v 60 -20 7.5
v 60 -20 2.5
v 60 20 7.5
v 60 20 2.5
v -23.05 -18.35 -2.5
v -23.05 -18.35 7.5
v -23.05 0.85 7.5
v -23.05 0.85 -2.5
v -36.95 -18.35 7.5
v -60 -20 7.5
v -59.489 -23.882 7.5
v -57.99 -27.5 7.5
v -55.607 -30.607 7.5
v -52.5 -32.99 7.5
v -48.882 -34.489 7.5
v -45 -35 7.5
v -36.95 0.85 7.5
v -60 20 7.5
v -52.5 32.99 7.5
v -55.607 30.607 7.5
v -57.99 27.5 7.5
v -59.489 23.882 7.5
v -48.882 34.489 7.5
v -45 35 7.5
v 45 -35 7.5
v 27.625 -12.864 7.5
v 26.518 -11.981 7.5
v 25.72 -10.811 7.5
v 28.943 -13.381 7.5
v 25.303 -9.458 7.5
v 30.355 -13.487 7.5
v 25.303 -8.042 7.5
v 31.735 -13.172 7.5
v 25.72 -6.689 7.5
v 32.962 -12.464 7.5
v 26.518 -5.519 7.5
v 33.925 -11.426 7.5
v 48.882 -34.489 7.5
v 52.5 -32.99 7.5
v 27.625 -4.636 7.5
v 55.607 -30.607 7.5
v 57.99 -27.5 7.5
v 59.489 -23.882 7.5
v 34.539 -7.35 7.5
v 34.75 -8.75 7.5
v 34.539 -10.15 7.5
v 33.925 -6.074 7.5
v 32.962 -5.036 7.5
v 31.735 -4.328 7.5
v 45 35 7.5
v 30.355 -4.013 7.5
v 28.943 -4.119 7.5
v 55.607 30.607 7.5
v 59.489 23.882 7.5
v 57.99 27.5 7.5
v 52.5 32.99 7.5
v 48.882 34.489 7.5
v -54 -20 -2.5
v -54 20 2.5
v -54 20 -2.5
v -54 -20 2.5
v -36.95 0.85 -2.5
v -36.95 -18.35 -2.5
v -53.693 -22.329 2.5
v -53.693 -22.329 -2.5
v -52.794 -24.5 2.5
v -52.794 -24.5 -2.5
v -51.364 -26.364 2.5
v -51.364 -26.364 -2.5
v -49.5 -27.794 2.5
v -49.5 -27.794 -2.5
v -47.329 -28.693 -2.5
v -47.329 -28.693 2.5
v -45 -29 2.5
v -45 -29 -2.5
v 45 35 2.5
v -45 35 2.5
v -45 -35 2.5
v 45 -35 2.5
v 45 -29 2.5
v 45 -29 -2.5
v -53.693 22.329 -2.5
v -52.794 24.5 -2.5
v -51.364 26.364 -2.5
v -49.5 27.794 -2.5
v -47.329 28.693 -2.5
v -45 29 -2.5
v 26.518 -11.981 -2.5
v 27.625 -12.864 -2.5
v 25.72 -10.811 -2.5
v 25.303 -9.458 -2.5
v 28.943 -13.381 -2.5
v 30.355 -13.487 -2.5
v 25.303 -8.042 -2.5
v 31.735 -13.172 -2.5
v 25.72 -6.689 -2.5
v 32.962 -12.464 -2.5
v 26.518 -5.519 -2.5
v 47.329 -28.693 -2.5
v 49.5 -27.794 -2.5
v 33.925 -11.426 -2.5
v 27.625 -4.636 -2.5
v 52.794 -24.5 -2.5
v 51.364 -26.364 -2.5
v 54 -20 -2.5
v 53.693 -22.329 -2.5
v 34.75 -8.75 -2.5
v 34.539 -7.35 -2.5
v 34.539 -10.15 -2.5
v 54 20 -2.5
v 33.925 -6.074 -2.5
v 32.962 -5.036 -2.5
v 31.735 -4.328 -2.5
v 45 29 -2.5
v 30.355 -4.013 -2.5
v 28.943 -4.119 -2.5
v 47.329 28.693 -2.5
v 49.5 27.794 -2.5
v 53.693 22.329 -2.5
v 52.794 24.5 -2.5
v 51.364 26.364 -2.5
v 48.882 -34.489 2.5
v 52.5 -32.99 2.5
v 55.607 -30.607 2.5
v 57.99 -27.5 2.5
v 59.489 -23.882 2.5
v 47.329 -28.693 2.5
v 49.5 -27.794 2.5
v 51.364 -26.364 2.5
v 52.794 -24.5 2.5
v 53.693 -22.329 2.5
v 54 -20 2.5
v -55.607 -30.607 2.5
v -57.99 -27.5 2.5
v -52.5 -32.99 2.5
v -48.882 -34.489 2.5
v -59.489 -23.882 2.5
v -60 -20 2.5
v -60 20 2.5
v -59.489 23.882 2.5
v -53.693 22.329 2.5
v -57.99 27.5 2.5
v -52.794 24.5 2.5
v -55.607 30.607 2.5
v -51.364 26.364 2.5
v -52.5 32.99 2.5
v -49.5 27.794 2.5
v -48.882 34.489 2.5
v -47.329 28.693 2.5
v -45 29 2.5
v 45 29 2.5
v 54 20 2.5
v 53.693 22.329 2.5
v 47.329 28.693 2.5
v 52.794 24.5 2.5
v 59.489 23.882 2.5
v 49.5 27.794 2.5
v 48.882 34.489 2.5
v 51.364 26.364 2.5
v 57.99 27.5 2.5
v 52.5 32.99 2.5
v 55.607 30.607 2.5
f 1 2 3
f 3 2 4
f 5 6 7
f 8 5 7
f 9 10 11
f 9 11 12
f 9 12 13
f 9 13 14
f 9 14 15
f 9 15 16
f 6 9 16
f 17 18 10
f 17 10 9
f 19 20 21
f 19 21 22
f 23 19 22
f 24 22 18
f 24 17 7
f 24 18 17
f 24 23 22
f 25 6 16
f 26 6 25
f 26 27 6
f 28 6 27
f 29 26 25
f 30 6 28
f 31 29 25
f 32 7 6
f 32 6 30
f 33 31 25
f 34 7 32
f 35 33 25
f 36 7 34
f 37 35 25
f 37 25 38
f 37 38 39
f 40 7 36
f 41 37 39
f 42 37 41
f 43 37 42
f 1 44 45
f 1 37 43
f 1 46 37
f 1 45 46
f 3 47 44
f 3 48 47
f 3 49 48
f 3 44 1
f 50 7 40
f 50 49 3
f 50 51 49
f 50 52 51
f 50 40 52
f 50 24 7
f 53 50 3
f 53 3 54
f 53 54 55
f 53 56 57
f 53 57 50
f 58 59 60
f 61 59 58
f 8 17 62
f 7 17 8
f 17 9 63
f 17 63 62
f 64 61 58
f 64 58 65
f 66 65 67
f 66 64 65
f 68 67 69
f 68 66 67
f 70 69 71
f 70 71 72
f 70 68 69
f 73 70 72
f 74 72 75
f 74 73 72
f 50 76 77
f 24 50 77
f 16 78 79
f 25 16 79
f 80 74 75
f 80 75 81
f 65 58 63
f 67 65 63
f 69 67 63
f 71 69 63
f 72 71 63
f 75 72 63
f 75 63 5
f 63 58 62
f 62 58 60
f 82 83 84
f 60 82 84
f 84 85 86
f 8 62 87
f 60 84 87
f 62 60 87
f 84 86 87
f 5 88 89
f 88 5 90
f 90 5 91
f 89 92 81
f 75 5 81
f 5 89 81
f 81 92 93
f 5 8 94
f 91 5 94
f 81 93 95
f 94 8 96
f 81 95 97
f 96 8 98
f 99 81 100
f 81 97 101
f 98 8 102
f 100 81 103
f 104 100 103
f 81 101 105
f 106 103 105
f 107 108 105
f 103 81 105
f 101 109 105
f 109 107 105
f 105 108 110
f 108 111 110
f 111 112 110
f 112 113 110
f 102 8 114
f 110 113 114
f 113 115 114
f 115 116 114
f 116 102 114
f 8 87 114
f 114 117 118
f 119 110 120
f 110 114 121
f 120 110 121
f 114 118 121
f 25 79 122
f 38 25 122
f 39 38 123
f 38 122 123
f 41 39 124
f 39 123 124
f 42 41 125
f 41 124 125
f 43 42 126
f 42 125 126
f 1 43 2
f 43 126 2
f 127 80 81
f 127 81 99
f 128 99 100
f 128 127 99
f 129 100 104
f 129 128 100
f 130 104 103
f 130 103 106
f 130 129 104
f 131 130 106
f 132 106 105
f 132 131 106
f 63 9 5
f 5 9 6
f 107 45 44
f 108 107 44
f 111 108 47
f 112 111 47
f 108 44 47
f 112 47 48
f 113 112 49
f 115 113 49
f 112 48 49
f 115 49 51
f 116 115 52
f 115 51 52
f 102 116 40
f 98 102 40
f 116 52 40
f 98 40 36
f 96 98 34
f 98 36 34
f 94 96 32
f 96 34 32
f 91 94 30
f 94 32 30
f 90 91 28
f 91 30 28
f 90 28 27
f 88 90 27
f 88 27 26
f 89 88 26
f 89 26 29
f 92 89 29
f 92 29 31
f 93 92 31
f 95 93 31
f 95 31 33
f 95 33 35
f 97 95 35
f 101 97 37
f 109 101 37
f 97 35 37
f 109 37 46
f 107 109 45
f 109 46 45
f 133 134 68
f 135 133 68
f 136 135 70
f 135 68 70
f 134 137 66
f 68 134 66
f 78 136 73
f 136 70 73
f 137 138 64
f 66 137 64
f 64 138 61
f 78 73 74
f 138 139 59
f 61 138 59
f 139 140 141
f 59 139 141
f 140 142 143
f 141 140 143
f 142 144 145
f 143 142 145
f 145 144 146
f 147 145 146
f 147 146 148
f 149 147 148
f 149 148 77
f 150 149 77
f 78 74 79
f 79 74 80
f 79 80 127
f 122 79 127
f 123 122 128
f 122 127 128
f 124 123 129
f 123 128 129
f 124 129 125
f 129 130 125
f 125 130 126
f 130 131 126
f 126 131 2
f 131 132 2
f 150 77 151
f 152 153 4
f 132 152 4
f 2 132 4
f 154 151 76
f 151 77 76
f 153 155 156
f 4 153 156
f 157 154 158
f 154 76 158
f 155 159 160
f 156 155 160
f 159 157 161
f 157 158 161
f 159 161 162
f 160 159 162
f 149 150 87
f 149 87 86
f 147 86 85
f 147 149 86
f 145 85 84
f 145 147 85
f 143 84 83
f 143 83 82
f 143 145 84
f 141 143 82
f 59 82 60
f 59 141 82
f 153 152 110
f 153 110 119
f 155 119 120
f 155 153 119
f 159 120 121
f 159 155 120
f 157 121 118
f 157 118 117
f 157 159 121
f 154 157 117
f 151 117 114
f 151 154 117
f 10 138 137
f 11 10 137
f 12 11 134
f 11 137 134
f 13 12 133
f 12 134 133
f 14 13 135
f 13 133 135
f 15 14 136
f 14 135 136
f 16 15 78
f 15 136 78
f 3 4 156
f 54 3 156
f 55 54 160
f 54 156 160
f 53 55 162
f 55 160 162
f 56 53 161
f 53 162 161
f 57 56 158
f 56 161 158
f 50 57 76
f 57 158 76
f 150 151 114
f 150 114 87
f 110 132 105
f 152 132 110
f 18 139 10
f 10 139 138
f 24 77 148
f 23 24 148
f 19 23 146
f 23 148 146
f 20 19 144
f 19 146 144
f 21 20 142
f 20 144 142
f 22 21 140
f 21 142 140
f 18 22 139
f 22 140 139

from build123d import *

# Parameters (mm, degrees)
F2_DEPTH = 5
F3_DEPTH = 5
F4_W     = 13.9
F4_H     = 19.2
F4_R     = 4.75
F5_DEPTH = 10


with BuildPart() as f2:
    # F1 (on offset) → F2 (new body)
    with BuildSketch(Plane.XY.offset(2.5)):
        with BuildLine():
            Line((45, 35), (-45, 35))
            ThreePointArc((-45, 35), (-55.6066017178, 30.6066017178), (-60, 20))
            Line((-60, 20), (-60, -20))
            ThreePointArc((-60, -20), (-55.6066017178, -30.6066017178), (-45, -35))
            Line((-45, -35), (45, -35))
            ThreePointArc((45, -35), (55.6066017178, -30.6066017178), (60, -20))
            Line((60, -20), (60, 20))
            ThreePointArc((60, 20), (55.6066017178, 30.6066017178), (45, 35))
        make_face()
        with BuildLine():
            Line((-45, 30), (45, 30))
            ThreePointArc((45, 30), (52.0710678119, 27.0710678119), (55, 20))
            Line((55, 20), (55, -20))
            ThreePointArc((55, -20), (52.0710678119, -27.0710678119), (45, -30))
            Line((45, -30), (-45, -30))
            ThreePointArc((-45, -30), (-52.0710678119, -27.0710678119), (-55, -20))
            Line((-55, -20), (-55, 20))
            ThreePointArc((-55, 20), (-52.0710678119, 27.0710678119), (-45, 30))
        make_face(mode=Mode.SUBTRACT)
        with BuildLine():
            ThreePointArc((55, 20), (52.0710678119, 27.0710678119), (45, 30))
            Line((45, 30), (-45, 30))
            ThreePointArc((-45, 30), (-52.0710678119, 27.0710678119), (-55, 20))
            Line((-55, 20), (-55, -20))
            ThreePointArc((-55, -20), (-52.0710678119, -27.0710678119), (-45, -30))
            Line((-45, -30), (45, -30))
            ThreePointArc((45, -30), (52.0710678119, -27.0710678119), (55, -20))
            Line((55, -20), (55, 20))
        make_face()
        with BuildLine():
            Line((-45, 29), (45, 29))
            ThreePointArc((45, 29), (51.3639610307, 26.3639610307), (54, 20))
            Line((54, 20), (54, -20))
            ThreePointArc((54, -20), (51.3639610307, -26.3639610307), (45, -29))
            Line((45, -29), (-45, -29))
            ThreePointArc((-45, -29), (-51.3639610307, -26.3639610307), (-54, -20))
            Line((-54, -20), (-54, 20))
            ThreePointArc((-54, 20), (-51.3639610307, 26.3639610307), (-45, 29))
        make_face(mode=Mode.SUBTRACT)
        with BuildLine():
            ThreePointArc((54, 20), (51.3639610307, 26.3639610307), (45, 29))
            Line((45, 29), (-45, 29))
            ThreePointArc((-45, 29), (-51.3639610307, 26.3639610307), (-54, 20))
            Line((-54, 20), (-54, -20))
            ThreePointArc((-54, -20), (-51.3639610307, -26.3639610307), (-45, -29))
            Line((-45, -29), (45, -29))
            ThreePointArc((45, -29), (51.3639610307, -26.3639610307), (54, -20))
            Line((54, -20), (54, 20))
        make_face()
    extrude(amount=F2_DEPTH)

    # F1 (on offset) → F3 (join)
    with BuildSketch(Plane.XY.offset(2.5)):
        with BuildLine():
            ThreePointArc((54, 20), (51.3639610307, 26.3639610307), (45, 29))
            Line((45, 29), (-45, 29))
            ThreePointArc((-45, 29), (-51.3639610307, 26.3639610307), (-54, 20))
            Line((-54, 20), (-54, -20))
            ThreePointArc((-54, -20), (-51.3639610307, -26.3639610307), (-45, -29))
            Line((-45, -29), (45, -29))
            ThreePointArc((45, -29), (51.3639610307, -26.3639610307), (54, -20))
            Line((54, -20), (54, 20))
        make_face()
    extrude(amount=-F3_DEPTH)

    # F4 (on face) → F5 (cut, through all)
    with BuildSketch(Plane.XY.offset(7.5)):
        with Locations((-30, -8.75)):
            Rectangle(F4_W, F4_H)
        with Locations((30, -8.75)):
            Circle(F4_R)
    extrude(amount=-F5_DEPTH, mode=Mode.SUBTRACT)


solid = f2.part
